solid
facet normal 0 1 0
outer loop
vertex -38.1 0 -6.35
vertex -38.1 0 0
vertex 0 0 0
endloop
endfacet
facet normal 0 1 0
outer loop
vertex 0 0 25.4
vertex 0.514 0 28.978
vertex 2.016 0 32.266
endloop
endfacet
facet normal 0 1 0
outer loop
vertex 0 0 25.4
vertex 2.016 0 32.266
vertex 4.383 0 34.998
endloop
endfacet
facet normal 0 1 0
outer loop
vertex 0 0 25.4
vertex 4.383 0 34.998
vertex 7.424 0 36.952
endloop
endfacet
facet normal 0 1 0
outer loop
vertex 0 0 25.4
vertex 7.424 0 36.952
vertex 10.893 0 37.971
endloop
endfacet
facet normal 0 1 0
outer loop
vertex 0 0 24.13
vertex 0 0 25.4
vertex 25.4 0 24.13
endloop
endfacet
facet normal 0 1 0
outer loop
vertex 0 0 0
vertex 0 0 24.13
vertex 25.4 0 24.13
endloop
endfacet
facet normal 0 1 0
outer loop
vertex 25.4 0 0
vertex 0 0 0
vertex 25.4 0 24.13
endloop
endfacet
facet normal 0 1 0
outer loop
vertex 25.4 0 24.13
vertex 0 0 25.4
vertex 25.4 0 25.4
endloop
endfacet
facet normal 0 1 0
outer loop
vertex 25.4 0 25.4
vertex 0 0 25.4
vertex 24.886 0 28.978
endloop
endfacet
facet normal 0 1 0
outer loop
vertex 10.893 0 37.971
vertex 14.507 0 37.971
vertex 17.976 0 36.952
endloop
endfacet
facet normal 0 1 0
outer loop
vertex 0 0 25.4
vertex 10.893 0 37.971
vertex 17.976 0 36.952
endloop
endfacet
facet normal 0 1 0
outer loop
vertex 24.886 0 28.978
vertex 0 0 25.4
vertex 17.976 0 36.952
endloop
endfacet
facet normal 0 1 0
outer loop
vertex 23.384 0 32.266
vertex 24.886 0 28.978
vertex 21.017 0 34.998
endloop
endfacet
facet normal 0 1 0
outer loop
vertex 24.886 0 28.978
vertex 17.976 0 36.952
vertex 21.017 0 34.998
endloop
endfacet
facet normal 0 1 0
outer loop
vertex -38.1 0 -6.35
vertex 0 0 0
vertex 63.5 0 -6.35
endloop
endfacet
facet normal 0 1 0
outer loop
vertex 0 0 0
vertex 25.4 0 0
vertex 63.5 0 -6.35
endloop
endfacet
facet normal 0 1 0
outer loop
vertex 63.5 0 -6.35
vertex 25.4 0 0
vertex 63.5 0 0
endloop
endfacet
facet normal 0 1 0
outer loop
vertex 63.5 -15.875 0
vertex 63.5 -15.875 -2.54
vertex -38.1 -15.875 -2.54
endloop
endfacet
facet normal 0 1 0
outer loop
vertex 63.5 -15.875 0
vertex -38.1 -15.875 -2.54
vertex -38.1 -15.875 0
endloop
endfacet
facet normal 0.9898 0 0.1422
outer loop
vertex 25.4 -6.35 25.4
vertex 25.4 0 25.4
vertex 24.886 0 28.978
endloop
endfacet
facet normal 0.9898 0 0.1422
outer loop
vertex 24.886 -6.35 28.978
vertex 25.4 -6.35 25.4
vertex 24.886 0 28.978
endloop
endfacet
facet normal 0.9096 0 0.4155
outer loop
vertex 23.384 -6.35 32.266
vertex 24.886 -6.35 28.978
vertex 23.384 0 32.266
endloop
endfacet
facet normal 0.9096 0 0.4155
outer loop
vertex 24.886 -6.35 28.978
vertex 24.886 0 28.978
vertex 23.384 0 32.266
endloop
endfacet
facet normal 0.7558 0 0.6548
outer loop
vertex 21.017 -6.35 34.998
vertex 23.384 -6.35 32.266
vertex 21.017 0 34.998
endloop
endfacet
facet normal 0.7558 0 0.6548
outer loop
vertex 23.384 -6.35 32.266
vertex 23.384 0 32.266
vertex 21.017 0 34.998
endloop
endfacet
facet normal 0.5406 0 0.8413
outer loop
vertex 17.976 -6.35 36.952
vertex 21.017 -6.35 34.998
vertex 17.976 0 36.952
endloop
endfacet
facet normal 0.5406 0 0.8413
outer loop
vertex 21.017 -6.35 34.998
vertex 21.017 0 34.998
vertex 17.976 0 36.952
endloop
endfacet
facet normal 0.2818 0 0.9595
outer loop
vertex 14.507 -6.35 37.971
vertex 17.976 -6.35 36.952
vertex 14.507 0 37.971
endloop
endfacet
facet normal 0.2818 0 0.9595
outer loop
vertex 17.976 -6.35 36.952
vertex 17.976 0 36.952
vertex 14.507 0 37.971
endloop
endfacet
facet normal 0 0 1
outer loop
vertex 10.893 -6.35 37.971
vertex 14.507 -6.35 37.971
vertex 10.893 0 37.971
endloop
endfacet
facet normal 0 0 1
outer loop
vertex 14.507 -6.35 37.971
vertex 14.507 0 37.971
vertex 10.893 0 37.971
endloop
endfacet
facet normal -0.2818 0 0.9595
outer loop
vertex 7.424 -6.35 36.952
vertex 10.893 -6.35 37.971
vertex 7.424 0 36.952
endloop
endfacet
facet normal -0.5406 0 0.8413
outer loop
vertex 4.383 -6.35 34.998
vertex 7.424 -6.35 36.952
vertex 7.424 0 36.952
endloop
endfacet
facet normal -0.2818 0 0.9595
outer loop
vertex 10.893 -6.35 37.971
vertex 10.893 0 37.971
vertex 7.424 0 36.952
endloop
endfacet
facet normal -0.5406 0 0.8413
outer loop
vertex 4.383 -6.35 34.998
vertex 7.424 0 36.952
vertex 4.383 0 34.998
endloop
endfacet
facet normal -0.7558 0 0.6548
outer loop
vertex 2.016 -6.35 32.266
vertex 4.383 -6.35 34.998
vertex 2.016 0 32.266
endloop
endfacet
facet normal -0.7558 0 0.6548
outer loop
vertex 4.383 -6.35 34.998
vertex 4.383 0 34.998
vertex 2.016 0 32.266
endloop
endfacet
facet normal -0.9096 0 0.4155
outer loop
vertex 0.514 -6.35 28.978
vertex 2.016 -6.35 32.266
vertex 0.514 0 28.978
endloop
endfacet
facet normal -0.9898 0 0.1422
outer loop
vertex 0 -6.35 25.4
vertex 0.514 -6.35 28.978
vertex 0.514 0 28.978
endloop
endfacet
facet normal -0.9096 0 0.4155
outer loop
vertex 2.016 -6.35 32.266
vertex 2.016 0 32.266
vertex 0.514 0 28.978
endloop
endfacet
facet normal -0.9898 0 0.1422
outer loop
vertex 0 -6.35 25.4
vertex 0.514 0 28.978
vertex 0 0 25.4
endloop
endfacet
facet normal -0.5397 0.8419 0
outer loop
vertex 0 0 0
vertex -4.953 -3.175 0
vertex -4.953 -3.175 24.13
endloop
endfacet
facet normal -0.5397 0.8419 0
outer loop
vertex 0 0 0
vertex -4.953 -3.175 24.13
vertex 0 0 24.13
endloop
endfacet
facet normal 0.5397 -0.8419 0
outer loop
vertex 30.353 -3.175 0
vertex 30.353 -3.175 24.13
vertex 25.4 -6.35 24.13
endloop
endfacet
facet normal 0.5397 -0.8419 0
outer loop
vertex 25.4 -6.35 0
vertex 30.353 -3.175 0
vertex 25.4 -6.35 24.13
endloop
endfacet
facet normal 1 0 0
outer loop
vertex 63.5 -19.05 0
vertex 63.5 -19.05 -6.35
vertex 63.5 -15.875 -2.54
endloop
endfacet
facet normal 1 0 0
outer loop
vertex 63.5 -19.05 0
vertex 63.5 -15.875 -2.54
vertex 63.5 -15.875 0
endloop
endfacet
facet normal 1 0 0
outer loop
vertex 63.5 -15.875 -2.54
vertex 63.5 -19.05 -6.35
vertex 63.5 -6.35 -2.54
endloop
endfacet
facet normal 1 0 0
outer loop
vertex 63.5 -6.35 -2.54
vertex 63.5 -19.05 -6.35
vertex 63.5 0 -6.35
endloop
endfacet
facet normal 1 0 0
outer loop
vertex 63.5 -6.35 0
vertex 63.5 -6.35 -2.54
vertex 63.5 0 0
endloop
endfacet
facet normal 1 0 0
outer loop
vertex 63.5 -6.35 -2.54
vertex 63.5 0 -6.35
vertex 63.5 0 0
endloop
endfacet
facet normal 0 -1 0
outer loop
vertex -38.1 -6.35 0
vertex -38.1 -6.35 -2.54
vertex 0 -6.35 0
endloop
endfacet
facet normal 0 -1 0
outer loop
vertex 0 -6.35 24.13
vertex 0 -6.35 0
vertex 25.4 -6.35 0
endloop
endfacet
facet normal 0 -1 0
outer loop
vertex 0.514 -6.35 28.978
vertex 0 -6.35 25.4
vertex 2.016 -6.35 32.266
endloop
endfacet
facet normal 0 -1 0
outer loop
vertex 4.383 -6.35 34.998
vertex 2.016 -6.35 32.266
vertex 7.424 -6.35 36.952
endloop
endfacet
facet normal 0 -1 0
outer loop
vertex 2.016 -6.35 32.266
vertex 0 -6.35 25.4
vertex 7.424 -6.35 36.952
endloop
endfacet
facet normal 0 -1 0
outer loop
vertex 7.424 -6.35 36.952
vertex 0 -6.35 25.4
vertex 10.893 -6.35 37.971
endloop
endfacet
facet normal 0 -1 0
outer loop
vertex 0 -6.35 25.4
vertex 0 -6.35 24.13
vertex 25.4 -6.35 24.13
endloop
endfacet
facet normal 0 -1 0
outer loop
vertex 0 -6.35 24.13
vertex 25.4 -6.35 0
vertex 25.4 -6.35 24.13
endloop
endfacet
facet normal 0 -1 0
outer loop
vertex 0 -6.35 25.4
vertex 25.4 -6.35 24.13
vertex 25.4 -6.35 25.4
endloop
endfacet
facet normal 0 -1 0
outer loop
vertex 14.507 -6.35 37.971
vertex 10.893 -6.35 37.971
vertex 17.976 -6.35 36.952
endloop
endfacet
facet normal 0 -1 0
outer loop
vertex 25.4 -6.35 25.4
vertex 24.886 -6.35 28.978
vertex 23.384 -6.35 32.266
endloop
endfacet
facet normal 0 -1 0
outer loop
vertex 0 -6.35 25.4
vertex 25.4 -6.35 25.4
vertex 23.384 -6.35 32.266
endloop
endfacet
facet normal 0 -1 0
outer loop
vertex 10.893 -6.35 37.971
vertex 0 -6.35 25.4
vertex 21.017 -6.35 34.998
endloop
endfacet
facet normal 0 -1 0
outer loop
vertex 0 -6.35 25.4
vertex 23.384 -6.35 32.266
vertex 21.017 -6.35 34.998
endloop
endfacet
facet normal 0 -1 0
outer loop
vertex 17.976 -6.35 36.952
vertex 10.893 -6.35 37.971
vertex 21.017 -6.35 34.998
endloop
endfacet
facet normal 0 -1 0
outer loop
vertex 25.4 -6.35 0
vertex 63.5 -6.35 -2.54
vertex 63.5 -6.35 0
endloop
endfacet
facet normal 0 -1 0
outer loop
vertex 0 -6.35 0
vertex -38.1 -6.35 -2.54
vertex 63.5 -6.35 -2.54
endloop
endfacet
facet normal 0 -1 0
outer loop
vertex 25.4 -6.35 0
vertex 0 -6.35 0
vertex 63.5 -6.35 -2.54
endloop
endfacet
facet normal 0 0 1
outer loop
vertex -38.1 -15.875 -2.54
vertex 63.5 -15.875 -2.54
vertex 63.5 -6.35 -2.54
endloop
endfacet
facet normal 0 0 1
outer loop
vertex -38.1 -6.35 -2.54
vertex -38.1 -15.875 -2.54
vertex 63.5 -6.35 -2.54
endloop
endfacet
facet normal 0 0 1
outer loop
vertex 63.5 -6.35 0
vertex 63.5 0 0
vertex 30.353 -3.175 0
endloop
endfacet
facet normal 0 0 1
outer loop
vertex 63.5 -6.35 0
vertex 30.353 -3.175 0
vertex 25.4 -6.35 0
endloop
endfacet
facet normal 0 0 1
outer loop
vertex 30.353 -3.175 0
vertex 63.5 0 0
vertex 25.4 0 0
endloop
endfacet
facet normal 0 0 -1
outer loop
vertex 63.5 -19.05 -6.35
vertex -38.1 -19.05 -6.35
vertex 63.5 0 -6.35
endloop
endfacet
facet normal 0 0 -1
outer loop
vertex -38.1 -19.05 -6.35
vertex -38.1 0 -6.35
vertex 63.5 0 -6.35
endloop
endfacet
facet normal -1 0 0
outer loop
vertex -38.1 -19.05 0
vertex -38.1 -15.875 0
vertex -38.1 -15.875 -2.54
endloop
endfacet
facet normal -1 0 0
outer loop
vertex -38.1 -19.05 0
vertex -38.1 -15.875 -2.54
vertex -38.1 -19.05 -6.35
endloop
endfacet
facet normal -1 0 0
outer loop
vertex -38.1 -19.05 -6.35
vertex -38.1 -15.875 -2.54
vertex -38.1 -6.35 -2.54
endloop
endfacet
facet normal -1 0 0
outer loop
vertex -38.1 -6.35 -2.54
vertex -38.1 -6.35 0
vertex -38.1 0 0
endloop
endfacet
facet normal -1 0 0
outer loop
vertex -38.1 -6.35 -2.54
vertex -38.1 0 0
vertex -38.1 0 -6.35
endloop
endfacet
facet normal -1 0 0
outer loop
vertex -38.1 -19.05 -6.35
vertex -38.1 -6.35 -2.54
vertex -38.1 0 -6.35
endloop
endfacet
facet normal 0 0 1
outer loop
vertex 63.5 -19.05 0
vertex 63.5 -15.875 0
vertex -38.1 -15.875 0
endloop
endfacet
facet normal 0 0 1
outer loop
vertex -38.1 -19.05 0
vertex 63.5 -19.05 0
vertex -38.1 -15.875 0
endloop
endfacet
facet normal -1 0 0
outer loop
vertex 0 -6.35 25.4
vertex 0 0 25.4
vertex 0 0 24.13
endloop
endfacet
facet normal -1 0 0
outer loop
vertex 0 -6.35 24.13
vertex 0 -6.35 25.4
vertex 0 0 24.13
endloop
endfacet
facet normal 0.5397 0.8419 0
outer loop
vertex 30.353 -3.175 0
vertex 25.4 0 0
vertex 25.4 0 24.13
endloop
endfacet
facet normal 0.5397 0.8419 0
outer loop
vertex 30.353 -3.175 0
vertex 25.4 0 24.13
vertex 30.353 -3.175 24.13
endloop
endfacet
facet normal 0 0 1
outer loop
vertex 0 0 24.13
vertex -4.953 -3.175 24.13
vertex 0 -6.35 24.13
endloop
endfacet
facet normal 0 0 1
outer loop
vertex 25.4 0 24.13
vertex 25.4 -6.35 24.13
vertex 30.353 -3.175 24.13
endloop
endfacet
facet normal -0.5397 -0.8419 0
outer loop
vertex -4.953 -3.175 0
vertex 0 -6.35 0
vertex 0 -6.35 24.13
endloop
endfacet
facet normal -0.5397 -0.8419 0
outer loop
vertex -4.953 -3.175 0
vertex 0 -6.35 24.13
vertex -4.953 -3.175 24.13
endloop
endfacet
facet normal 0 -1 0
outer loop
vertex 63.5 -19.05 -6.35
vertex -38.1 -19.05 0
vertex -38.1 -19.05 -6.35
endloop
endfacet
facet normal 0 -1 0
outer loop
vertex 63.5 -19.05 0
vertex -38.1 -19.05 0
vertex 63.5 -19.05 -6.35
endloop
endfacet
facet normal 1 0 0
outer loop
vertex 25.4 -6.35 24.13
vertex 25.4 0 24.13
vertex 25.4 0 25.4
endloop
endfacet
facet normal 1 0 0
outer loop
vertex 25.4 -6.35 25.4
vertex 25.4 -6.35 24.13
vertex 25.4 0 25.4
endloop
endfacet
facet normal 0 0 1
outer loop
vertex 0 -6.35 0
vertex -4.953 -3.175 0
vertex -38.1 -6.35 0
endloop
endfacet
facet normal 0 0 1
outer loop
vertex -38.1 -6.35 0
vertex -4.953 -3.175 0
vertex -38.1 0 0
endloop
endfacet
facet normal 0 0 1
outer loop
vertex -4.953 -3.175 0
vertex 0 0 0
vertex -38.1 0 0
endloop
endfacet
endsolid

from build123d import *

# Parameters (mm, degrees)
F1_DEPTH = 6.35
F3_DEPTH = 24.13
F4_W     = 101.6
F4_H     = 6.35
F5_DEPTH = 6.35
F7_DEPTH = 12.7
F8_W     = 9.525
F8_H     = 2.54
F9_DEPTH = 114.282591


with BuildPart() as f1:
    # F0 (on Front) → F1 (new body)
    with BuildSketch(Plane.XZ):
        with BuildLine():
            Line((0, 25.4), (0, 0))
            Line((0, 0), (25.4, 0))
            Line((25.4, 0), (25.4, 25.4))
            ThreePointArc((25.4, 25.4), (12.7, 38.1), (0, 25.4))
        make_face()
    extrude(amount=F1_DEPTH)

    # F2 (on face) → F3 (join)
    with BuildSketch(Plane(origin=(0, 0, 0), x_dir=(1, 0, 0), z_dir=(0, 0, -1))):
        Polygon((-4.953, 3.175), (0, 0), (0, 6.35), align=None)
        Polygon((30.353, 3.175), (25.4, 6.35), (25.4, 0), align=None)
    extrude(amount=-F3_DEPTH)

    # F4 (on face) → F5 (join)
    with BuildSketch(Plane(origin=(0, 0, 0), x_dir=(1, 0, 0), z_dir=(0, 0, -1))):
        with Locations((12.7, 3.175)):
            Rectangle(F4_W, F4_H)
    extrude(amount=F5_DEPTH)

    # F6 (on face) → F7 (join)
    with BuildSketch(Plane.XZ.offset(6.35)):
        Polygon((25.4, 0), (0, 0), (-38.1, 0), (-38.1, -6.35), (63.5, -6.35), (63.5, 0), align=None)
    extrude(amount=F7_DEPTH)

    # F8 (on face) → F9 (cut)
    with BuildSketch(Plane.YZ.offset(63.5)):
        with Locations((-11.1125, -1.27)):
            Rectangle(F8_W, F8_H)
    extrude(amount=-F9_DEPTH, mode=Mode.SUBTRACT)


solid = f1.part
